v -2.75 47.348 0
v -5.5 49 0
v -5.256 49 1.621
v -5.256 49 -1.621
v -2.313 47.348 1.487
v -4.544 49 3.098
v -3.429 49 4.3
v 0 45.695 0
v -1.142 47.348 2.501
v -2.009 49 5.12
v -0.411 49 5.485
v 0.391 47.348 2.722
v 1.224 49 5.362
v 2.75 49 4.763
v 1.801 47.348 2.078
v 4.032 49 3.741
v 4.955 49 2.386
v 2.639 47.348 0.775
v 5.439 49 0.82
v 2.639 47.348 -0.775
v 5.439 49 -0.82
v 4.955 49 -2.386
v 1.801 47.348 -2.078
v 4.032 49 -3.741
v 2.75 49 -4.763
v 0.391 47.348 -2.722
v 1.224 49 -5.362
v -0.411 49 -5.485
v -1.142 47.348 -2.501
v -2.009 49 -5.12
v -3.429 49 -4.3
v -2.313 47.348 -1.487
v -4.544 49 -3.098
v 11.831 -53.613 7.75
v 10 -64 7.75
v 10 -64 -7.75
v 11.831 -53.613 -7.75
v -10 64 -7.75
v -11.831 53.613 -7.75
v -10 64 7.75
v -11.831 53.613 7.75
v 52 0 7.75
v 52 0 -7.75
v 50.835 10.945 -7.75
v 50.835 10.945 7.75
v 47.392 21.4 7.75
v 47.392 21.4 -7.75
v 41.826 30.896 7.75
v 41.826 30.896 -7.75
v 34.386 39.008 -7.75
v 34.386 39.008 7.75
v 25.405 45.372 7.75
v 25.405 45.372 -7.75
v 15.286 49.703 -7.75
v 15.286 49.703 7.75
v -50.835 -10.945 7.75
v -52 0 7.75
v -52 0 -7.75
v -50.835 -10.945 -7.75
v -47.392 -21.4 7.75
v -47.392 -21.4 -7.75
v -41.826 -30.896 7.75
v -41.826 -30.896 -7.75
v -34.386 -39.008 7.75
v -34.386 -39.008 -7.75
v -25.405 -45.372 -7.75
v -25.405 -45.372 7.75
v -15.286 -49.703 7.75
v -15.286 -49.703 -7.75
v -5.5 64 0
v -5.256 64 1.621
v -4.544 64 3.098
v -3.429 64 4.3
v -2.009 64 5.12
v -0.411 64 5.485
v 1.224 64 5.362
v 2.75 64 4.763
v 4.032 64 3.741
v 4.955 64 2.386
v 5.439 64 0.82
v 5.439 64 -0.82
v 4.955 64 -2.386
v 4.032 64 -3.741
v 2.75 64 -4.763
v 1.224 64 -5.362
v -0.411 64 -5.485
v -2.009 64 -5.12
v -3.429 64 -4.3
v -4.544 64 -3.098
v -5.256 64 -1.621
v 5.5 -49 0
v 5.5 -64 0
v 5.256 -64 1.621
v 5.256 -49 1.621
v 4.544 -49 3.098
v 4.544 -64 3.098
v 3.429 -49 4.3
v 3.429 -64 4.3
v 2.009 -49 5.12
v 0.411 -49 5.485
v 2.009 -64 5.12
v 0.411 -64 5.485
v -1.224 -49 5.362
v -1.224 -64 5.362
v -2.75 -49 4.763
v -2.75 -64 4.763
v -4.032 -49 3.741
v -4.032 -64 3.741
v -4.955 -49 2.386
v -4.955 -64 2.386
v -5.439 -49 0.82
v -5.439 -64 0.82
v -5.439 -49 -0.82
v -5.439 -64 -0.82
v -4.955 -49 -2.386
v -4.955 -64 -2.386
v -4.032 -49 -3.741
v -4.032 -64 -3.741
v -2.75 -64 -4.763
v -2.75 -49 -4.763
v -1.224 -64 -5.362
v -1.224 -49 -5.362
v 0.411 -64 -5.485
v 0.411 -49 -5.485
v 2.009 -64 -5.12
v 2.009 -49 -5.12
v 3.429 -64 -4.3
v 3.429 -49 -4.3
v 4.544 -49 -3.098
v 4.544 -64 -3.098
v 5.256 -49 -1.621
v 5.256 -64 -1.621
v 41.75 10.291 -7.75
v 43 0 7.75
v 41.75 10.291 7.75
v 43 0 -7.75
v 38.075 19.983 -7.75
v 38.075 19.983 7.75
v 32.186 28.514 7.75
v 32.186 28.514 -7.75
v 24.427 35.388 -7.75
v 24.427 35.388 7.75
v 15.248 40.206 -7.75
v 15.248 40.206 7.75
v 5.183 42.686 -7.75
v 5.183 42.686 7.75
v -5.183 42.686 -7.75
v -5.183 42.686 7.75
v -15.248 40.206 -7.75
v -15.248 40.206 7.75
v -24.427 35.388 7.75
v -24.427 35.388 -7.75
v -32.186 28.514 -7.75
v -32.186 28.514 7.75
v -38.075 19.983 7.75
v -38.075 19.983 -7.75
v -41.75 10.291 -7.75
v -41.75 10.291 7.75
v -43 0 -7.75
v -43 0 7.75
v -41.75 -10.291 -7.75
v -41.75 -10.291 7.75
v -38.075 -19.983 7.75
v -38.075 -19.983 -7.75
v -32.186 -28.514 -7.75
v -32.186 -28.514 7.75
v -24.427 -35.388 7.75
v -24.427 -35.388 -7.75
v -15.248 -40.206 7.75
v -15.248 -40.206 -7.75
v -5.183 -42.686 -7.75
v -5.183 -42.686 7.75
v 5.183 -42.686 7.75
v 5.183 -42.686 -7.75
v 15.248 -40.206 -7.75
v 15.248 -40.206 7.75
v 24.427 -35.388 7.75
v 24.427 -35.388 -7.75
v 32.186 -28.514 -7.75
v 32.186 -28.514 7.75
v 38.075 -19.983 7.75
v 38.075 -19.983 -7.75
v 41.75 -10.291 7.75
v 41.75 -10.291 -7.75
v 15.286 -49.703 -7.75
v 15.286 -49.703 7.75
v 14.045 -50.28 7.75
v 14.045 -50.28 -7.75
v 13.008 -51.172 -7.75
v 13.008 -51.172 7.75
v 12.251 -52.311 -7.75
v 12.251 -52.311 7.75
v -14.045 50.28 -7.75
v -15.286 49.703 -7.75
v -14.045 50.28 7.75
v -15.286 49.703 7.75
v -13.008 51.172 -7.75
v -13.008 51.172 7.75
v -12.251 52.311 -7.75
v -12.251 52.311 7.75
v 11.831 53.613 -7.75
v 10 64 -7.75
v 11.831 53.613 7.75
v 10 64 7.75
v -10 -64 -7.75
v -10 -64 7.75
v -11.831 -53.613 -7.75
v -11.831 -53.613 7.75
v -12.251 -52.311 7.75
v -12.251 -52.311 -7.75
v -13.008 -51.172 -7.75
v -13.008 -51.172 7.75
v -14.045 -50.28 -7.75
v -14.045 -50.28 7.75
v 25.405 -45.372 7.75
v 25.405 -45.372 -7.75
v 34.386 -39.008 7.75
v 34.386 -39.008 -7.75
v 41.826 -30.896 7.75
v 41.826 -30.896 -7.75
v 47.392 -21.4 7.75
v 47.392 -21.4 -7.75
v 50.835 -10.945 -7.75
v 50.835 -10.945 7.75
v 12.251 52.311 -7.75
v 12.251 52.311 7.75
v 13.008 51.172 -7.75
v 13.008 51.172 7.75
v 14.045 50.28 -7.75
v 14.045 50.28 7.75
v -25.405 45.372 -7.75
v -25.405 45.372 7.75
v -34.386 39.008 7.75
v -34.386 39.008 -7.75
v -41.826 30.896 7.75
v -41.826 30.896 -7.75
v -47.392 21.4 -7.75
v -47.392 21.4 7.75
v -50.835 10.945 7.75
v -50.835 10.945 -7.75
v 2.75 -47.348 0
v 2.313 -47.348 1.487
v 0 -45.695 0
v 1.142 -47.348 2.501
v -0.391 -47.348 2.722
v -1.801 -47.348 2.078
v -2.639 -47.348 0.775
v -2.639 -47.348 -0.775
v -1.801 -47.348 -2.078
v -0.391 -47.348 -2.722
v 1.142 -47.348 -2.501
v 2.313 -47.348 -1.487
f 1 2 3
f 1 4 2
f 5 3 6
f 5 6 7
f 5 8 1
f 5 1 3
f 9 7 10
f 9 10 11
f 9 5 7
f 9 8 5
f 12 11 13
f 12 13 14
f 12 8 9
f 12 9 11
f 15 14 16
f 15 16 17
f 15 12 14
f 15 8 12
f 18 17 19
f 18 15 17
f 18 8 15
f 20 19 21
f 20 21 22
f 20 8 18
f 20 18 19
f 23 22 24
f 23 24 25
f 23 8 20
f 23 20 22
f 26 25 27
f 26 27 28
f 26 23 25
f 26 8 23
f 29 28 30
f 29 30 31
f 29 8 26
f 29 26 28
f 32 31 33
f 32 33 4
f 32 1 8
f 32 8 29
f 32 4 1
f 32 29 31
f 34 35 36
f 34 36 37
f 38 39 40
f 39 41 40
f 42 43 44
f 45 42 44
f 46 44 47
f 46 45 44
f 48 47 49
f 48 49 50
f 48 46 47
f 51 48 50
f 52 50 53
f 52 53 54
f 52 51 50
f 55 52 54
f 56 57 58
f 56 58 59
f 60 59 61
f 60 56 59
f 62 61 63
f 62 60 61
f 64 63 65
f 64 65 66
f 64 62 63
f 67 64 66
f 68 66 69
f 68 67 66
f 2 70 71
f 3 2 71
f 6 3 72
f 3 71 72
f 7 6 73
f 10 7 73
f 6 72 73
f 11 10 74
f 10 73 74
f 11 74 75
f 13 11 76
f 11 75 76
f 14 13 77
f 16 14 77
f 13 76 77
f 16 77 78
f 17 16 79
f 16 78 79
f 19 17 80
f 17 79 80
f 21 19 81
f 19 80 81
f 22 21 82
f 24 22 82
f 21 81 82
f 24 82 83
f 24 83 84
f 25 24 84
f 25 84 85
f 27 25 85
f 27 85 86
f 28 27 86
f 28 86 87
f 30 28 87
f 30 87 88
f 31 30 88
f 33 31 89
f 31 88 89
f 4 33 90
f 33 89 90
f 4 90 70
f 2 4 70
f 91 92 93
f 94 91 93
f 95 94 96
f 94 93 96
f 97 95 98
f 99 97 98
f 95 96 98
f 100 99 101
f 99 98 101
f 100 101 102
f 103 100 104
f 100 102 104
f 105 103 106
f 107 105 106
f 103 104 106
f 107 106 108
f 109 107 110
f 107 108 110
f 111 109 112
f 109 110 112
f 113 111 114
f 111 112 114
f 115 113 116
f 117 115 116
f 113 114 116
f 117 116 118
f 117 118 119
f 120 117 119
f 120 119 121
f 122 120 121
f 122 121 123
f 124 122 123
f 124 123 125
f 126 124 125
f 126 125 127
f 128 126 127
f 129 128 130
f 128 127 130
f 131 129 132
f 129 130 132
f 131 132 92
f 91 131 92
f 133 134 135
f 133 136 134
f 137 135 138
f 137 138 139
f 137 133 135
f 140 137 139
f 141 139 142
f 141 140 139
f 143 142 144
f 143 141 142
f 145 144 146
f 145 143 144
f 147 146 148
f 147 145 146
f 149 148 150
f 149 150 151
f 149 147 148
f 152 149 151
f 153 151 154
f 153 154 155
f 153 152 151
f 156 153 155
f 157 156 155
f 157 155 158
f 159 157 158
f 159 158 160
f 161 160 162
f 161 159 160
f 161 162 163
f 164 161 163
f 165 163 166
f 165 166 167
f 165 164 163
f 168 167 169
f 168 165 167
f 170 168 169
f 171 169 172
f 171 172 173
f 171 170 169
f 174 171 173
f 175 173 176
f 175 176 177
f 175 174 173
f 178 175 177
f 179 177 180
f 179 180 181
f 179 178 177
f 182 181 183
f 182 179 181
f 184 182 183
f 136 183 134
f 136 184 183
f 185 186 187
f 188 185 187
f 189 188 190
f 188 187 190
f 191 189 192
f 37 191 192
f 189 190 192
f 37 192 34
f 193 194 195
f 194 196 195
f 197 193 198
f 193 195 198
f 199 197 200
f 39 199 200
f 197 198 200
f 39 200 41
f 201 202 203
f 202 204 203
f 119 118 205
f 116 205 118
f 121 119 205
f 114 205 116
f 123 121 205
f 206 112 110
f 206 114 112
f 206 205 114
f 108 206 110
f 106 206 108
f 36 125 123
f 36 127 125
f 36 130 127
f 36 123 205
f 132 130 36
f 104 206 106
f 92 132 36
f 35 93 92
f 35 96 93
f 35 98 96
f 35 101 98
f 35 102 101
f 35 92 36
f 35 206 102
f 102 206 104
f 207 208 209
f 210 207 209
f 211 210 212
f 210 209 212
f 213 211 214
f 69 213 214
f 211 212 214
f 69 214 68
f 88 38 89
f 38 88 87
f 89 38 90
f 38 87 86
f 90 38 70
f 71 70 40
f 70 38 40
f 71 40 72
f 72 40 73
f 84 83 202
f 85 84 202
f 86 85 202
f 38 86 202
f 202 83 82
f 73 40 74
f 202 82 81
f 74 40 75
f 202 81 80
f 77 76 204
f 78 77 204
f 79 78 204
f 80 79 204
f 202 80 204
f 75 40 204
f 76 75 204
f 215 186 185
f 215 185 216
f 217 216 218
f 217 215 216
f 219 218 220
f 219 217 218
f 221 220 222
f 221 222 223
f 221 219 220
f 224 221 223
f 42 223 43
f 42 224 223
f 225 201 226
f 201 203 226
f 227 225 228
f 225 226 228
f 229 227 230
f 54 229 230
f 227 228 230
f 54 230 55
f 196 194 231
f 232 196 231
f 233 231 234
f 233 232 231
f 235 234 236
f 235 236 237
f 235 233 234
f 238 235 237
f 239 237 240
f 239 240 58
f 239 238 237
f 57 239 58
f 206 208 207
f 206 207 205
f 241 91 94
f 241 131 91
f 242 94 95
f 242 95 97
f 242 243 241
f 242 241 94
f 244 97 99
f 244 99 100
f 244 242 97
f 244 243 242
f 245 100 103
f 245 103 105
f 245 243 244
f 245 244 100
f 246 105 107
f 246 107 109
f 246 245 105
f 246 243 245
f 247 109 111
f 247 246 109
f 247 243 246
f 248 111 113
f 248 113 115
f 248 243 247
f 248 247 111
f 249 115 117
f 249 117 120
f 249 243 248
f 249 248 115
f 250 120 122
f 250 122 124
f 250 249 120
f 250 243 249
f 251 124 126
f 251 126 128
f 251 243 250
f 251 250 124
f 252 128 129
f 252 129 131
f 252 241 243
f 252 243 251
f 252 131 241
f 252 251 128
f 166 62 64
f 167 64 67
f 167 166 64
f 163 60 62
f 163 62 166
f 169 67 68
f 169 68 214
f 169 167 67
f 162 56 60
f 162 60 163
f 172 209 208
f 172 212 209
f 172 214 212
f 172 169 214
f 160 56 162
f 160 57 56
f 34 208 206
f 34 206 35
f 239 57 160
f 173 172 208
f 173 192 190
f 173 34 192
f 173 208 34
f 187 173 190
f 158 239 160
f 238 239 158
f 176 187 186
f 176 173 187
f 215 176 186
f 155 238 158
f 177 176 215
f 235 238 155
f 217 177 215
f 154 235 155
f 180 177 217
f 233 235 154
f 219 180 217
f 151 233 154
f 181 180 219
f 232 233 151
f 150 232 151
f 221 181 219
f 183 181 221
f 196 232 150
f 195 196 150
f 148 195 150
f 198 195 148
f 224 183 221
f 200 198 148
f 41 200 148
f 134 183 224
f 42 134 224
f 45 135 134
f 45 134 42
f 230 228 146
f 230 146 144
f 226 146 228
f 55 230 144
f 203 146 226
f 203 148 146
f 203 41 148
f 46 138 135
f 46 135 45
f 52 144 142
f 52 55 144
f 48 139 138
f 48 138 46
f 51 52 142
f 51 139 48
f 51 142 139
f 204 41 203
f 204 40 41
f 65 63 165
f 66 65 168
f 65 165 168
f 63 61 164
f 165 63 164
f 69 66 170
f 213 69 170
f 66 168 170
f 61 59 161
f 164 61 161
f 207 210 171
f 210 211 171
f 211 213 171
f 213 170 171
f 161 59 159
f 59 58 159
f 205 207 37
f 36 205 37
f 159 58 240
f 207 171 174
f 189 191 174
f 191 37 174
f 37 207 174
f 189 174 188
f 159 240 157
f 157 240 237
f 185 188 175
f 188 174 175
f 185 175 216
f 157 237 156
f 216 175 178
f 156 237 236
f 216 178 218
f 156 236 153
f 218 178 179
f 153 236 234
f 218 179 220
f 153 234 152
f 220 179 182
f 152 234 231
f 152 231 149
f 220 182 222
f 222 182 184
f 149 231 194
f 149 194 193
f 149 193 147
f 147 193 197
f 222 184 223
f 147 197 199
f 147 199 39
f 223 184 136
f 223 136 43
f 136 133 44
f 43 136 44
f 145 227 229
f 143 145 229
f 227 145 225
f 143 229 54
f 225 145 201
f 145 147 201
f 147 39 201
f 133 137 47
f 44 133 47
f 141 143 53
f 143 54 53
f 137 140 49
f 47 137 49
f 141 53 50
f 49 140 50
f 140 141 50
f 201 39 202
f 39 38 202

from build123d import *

# Parameters (mm, degrees)
SKETCH007_R    = 43
PAD002_DEPTH   = 7.75
SKETCH_R       = 5.5
HOLE001_DEPTH  = 15
HOLE001_TIPS_R = 5.5
SKETCH083_R    = 5.5
HOLE002_DEPTH  = 15
HOLE002_TIPS_R = 5.5


with BuildPart() as part:
    # Sketch007 → Pad002 (new body, symmetric)
    with BuildSketch(Plane.XY):
        with BuildLine():
            ThreePointArc((-15.28569, 49.702592), (-41.826163, 30.896149), (-52, 0))
            ThreePointArc((-52, 0), (-41.826156, -30.89613), (-15.285695, -49.702561))
            ThreePointArc((-11.831435, -53.613416), (-13.007952, -51.171659), (-15.285695, -49.702561))
            Line((-11.831435, -53.613416), (-10, -64))
            Line((-10, -64), (10, -64))
            Line((10, -64), (11.831435, -53.613416))
            ThreePointArc((15.285695, -49.702561), (13.007952, -51.171659), (11.831435, -53.613416))
            ThreePointArc((15.285695, -49.702561), (41.826156, -30.89613), (52, 0))
            ThreePointArc((52, 0), (41.826163, 30.896149), (15.28569, 49.702592))
            ThreePointArc((11.83143, 53.613447), (13.007947, 51.17169), (15.28569, 49.702592))
            Line((10, 64), (11.83143, 53.613447))
            Line((-10, 64), (10, 64))
            Line((-11.83143, 53.613447), (-10, 64))
            ThreePointArc((-15.28569, 49.702592), (-13.007947, 51.17169), (-11.83143, 53.613447))
        make_face()
        Circle(SKETCH007_R, mode=Mode.SUBTRACT)
    extrude(amount=PAD002_DEPTH, both=True)

    # Sketch (on Face6 of Pad002) → Hole001 (cut)
    with BuildSketch(Plane.XZ.offset(64)):
        Circle(SKETCH_R)
    extrude(amount=-HOLE001_DEPTH, mode=Mode.SUBTRACT)

    # Hole001 tips → Hole001 tip 1 section 0
    with BuildSketch(Plane.XZ.offset(49), mode=Mode.PRIVATE) as hole001_tip_1_s0:
        Circle(HOLE001_TIPS_R)
    loft([hole001_tip_1_s0.sketch, Vertex(0, -45.695267, 0)], mode=Mode.SUBTRACT)

    # Sketch083 (on Face7 of Hole001) → Hole002 (cut)
    with BuildSketch(Plane(origin=(0, 64, 0), x_dir=(-1, 0, 0), z_dir=(0, 1, 0))):
        Circle(SKETCH083_R)
    extrude(amount=-HOLE002_DEPTH, mode=Mode.SUBTRACT)

    # Hole002 tips → Hole002 tip 1 section 0
    with BuildSketch(Plane(origin=(0, 49, 0), x_dir=(-1, 0, 0), z_dir=(0, 1, 0)), mode=Mode.PRIVATE) as hole002_tip_1_s0:
        Circle(HOLE002_TIPS_R)
    loft([hole002_tip_1_s0.sketch, Vertex(0, 45.695267, 0)], mode=Mode.SUBTRACT)


solid = part.part
